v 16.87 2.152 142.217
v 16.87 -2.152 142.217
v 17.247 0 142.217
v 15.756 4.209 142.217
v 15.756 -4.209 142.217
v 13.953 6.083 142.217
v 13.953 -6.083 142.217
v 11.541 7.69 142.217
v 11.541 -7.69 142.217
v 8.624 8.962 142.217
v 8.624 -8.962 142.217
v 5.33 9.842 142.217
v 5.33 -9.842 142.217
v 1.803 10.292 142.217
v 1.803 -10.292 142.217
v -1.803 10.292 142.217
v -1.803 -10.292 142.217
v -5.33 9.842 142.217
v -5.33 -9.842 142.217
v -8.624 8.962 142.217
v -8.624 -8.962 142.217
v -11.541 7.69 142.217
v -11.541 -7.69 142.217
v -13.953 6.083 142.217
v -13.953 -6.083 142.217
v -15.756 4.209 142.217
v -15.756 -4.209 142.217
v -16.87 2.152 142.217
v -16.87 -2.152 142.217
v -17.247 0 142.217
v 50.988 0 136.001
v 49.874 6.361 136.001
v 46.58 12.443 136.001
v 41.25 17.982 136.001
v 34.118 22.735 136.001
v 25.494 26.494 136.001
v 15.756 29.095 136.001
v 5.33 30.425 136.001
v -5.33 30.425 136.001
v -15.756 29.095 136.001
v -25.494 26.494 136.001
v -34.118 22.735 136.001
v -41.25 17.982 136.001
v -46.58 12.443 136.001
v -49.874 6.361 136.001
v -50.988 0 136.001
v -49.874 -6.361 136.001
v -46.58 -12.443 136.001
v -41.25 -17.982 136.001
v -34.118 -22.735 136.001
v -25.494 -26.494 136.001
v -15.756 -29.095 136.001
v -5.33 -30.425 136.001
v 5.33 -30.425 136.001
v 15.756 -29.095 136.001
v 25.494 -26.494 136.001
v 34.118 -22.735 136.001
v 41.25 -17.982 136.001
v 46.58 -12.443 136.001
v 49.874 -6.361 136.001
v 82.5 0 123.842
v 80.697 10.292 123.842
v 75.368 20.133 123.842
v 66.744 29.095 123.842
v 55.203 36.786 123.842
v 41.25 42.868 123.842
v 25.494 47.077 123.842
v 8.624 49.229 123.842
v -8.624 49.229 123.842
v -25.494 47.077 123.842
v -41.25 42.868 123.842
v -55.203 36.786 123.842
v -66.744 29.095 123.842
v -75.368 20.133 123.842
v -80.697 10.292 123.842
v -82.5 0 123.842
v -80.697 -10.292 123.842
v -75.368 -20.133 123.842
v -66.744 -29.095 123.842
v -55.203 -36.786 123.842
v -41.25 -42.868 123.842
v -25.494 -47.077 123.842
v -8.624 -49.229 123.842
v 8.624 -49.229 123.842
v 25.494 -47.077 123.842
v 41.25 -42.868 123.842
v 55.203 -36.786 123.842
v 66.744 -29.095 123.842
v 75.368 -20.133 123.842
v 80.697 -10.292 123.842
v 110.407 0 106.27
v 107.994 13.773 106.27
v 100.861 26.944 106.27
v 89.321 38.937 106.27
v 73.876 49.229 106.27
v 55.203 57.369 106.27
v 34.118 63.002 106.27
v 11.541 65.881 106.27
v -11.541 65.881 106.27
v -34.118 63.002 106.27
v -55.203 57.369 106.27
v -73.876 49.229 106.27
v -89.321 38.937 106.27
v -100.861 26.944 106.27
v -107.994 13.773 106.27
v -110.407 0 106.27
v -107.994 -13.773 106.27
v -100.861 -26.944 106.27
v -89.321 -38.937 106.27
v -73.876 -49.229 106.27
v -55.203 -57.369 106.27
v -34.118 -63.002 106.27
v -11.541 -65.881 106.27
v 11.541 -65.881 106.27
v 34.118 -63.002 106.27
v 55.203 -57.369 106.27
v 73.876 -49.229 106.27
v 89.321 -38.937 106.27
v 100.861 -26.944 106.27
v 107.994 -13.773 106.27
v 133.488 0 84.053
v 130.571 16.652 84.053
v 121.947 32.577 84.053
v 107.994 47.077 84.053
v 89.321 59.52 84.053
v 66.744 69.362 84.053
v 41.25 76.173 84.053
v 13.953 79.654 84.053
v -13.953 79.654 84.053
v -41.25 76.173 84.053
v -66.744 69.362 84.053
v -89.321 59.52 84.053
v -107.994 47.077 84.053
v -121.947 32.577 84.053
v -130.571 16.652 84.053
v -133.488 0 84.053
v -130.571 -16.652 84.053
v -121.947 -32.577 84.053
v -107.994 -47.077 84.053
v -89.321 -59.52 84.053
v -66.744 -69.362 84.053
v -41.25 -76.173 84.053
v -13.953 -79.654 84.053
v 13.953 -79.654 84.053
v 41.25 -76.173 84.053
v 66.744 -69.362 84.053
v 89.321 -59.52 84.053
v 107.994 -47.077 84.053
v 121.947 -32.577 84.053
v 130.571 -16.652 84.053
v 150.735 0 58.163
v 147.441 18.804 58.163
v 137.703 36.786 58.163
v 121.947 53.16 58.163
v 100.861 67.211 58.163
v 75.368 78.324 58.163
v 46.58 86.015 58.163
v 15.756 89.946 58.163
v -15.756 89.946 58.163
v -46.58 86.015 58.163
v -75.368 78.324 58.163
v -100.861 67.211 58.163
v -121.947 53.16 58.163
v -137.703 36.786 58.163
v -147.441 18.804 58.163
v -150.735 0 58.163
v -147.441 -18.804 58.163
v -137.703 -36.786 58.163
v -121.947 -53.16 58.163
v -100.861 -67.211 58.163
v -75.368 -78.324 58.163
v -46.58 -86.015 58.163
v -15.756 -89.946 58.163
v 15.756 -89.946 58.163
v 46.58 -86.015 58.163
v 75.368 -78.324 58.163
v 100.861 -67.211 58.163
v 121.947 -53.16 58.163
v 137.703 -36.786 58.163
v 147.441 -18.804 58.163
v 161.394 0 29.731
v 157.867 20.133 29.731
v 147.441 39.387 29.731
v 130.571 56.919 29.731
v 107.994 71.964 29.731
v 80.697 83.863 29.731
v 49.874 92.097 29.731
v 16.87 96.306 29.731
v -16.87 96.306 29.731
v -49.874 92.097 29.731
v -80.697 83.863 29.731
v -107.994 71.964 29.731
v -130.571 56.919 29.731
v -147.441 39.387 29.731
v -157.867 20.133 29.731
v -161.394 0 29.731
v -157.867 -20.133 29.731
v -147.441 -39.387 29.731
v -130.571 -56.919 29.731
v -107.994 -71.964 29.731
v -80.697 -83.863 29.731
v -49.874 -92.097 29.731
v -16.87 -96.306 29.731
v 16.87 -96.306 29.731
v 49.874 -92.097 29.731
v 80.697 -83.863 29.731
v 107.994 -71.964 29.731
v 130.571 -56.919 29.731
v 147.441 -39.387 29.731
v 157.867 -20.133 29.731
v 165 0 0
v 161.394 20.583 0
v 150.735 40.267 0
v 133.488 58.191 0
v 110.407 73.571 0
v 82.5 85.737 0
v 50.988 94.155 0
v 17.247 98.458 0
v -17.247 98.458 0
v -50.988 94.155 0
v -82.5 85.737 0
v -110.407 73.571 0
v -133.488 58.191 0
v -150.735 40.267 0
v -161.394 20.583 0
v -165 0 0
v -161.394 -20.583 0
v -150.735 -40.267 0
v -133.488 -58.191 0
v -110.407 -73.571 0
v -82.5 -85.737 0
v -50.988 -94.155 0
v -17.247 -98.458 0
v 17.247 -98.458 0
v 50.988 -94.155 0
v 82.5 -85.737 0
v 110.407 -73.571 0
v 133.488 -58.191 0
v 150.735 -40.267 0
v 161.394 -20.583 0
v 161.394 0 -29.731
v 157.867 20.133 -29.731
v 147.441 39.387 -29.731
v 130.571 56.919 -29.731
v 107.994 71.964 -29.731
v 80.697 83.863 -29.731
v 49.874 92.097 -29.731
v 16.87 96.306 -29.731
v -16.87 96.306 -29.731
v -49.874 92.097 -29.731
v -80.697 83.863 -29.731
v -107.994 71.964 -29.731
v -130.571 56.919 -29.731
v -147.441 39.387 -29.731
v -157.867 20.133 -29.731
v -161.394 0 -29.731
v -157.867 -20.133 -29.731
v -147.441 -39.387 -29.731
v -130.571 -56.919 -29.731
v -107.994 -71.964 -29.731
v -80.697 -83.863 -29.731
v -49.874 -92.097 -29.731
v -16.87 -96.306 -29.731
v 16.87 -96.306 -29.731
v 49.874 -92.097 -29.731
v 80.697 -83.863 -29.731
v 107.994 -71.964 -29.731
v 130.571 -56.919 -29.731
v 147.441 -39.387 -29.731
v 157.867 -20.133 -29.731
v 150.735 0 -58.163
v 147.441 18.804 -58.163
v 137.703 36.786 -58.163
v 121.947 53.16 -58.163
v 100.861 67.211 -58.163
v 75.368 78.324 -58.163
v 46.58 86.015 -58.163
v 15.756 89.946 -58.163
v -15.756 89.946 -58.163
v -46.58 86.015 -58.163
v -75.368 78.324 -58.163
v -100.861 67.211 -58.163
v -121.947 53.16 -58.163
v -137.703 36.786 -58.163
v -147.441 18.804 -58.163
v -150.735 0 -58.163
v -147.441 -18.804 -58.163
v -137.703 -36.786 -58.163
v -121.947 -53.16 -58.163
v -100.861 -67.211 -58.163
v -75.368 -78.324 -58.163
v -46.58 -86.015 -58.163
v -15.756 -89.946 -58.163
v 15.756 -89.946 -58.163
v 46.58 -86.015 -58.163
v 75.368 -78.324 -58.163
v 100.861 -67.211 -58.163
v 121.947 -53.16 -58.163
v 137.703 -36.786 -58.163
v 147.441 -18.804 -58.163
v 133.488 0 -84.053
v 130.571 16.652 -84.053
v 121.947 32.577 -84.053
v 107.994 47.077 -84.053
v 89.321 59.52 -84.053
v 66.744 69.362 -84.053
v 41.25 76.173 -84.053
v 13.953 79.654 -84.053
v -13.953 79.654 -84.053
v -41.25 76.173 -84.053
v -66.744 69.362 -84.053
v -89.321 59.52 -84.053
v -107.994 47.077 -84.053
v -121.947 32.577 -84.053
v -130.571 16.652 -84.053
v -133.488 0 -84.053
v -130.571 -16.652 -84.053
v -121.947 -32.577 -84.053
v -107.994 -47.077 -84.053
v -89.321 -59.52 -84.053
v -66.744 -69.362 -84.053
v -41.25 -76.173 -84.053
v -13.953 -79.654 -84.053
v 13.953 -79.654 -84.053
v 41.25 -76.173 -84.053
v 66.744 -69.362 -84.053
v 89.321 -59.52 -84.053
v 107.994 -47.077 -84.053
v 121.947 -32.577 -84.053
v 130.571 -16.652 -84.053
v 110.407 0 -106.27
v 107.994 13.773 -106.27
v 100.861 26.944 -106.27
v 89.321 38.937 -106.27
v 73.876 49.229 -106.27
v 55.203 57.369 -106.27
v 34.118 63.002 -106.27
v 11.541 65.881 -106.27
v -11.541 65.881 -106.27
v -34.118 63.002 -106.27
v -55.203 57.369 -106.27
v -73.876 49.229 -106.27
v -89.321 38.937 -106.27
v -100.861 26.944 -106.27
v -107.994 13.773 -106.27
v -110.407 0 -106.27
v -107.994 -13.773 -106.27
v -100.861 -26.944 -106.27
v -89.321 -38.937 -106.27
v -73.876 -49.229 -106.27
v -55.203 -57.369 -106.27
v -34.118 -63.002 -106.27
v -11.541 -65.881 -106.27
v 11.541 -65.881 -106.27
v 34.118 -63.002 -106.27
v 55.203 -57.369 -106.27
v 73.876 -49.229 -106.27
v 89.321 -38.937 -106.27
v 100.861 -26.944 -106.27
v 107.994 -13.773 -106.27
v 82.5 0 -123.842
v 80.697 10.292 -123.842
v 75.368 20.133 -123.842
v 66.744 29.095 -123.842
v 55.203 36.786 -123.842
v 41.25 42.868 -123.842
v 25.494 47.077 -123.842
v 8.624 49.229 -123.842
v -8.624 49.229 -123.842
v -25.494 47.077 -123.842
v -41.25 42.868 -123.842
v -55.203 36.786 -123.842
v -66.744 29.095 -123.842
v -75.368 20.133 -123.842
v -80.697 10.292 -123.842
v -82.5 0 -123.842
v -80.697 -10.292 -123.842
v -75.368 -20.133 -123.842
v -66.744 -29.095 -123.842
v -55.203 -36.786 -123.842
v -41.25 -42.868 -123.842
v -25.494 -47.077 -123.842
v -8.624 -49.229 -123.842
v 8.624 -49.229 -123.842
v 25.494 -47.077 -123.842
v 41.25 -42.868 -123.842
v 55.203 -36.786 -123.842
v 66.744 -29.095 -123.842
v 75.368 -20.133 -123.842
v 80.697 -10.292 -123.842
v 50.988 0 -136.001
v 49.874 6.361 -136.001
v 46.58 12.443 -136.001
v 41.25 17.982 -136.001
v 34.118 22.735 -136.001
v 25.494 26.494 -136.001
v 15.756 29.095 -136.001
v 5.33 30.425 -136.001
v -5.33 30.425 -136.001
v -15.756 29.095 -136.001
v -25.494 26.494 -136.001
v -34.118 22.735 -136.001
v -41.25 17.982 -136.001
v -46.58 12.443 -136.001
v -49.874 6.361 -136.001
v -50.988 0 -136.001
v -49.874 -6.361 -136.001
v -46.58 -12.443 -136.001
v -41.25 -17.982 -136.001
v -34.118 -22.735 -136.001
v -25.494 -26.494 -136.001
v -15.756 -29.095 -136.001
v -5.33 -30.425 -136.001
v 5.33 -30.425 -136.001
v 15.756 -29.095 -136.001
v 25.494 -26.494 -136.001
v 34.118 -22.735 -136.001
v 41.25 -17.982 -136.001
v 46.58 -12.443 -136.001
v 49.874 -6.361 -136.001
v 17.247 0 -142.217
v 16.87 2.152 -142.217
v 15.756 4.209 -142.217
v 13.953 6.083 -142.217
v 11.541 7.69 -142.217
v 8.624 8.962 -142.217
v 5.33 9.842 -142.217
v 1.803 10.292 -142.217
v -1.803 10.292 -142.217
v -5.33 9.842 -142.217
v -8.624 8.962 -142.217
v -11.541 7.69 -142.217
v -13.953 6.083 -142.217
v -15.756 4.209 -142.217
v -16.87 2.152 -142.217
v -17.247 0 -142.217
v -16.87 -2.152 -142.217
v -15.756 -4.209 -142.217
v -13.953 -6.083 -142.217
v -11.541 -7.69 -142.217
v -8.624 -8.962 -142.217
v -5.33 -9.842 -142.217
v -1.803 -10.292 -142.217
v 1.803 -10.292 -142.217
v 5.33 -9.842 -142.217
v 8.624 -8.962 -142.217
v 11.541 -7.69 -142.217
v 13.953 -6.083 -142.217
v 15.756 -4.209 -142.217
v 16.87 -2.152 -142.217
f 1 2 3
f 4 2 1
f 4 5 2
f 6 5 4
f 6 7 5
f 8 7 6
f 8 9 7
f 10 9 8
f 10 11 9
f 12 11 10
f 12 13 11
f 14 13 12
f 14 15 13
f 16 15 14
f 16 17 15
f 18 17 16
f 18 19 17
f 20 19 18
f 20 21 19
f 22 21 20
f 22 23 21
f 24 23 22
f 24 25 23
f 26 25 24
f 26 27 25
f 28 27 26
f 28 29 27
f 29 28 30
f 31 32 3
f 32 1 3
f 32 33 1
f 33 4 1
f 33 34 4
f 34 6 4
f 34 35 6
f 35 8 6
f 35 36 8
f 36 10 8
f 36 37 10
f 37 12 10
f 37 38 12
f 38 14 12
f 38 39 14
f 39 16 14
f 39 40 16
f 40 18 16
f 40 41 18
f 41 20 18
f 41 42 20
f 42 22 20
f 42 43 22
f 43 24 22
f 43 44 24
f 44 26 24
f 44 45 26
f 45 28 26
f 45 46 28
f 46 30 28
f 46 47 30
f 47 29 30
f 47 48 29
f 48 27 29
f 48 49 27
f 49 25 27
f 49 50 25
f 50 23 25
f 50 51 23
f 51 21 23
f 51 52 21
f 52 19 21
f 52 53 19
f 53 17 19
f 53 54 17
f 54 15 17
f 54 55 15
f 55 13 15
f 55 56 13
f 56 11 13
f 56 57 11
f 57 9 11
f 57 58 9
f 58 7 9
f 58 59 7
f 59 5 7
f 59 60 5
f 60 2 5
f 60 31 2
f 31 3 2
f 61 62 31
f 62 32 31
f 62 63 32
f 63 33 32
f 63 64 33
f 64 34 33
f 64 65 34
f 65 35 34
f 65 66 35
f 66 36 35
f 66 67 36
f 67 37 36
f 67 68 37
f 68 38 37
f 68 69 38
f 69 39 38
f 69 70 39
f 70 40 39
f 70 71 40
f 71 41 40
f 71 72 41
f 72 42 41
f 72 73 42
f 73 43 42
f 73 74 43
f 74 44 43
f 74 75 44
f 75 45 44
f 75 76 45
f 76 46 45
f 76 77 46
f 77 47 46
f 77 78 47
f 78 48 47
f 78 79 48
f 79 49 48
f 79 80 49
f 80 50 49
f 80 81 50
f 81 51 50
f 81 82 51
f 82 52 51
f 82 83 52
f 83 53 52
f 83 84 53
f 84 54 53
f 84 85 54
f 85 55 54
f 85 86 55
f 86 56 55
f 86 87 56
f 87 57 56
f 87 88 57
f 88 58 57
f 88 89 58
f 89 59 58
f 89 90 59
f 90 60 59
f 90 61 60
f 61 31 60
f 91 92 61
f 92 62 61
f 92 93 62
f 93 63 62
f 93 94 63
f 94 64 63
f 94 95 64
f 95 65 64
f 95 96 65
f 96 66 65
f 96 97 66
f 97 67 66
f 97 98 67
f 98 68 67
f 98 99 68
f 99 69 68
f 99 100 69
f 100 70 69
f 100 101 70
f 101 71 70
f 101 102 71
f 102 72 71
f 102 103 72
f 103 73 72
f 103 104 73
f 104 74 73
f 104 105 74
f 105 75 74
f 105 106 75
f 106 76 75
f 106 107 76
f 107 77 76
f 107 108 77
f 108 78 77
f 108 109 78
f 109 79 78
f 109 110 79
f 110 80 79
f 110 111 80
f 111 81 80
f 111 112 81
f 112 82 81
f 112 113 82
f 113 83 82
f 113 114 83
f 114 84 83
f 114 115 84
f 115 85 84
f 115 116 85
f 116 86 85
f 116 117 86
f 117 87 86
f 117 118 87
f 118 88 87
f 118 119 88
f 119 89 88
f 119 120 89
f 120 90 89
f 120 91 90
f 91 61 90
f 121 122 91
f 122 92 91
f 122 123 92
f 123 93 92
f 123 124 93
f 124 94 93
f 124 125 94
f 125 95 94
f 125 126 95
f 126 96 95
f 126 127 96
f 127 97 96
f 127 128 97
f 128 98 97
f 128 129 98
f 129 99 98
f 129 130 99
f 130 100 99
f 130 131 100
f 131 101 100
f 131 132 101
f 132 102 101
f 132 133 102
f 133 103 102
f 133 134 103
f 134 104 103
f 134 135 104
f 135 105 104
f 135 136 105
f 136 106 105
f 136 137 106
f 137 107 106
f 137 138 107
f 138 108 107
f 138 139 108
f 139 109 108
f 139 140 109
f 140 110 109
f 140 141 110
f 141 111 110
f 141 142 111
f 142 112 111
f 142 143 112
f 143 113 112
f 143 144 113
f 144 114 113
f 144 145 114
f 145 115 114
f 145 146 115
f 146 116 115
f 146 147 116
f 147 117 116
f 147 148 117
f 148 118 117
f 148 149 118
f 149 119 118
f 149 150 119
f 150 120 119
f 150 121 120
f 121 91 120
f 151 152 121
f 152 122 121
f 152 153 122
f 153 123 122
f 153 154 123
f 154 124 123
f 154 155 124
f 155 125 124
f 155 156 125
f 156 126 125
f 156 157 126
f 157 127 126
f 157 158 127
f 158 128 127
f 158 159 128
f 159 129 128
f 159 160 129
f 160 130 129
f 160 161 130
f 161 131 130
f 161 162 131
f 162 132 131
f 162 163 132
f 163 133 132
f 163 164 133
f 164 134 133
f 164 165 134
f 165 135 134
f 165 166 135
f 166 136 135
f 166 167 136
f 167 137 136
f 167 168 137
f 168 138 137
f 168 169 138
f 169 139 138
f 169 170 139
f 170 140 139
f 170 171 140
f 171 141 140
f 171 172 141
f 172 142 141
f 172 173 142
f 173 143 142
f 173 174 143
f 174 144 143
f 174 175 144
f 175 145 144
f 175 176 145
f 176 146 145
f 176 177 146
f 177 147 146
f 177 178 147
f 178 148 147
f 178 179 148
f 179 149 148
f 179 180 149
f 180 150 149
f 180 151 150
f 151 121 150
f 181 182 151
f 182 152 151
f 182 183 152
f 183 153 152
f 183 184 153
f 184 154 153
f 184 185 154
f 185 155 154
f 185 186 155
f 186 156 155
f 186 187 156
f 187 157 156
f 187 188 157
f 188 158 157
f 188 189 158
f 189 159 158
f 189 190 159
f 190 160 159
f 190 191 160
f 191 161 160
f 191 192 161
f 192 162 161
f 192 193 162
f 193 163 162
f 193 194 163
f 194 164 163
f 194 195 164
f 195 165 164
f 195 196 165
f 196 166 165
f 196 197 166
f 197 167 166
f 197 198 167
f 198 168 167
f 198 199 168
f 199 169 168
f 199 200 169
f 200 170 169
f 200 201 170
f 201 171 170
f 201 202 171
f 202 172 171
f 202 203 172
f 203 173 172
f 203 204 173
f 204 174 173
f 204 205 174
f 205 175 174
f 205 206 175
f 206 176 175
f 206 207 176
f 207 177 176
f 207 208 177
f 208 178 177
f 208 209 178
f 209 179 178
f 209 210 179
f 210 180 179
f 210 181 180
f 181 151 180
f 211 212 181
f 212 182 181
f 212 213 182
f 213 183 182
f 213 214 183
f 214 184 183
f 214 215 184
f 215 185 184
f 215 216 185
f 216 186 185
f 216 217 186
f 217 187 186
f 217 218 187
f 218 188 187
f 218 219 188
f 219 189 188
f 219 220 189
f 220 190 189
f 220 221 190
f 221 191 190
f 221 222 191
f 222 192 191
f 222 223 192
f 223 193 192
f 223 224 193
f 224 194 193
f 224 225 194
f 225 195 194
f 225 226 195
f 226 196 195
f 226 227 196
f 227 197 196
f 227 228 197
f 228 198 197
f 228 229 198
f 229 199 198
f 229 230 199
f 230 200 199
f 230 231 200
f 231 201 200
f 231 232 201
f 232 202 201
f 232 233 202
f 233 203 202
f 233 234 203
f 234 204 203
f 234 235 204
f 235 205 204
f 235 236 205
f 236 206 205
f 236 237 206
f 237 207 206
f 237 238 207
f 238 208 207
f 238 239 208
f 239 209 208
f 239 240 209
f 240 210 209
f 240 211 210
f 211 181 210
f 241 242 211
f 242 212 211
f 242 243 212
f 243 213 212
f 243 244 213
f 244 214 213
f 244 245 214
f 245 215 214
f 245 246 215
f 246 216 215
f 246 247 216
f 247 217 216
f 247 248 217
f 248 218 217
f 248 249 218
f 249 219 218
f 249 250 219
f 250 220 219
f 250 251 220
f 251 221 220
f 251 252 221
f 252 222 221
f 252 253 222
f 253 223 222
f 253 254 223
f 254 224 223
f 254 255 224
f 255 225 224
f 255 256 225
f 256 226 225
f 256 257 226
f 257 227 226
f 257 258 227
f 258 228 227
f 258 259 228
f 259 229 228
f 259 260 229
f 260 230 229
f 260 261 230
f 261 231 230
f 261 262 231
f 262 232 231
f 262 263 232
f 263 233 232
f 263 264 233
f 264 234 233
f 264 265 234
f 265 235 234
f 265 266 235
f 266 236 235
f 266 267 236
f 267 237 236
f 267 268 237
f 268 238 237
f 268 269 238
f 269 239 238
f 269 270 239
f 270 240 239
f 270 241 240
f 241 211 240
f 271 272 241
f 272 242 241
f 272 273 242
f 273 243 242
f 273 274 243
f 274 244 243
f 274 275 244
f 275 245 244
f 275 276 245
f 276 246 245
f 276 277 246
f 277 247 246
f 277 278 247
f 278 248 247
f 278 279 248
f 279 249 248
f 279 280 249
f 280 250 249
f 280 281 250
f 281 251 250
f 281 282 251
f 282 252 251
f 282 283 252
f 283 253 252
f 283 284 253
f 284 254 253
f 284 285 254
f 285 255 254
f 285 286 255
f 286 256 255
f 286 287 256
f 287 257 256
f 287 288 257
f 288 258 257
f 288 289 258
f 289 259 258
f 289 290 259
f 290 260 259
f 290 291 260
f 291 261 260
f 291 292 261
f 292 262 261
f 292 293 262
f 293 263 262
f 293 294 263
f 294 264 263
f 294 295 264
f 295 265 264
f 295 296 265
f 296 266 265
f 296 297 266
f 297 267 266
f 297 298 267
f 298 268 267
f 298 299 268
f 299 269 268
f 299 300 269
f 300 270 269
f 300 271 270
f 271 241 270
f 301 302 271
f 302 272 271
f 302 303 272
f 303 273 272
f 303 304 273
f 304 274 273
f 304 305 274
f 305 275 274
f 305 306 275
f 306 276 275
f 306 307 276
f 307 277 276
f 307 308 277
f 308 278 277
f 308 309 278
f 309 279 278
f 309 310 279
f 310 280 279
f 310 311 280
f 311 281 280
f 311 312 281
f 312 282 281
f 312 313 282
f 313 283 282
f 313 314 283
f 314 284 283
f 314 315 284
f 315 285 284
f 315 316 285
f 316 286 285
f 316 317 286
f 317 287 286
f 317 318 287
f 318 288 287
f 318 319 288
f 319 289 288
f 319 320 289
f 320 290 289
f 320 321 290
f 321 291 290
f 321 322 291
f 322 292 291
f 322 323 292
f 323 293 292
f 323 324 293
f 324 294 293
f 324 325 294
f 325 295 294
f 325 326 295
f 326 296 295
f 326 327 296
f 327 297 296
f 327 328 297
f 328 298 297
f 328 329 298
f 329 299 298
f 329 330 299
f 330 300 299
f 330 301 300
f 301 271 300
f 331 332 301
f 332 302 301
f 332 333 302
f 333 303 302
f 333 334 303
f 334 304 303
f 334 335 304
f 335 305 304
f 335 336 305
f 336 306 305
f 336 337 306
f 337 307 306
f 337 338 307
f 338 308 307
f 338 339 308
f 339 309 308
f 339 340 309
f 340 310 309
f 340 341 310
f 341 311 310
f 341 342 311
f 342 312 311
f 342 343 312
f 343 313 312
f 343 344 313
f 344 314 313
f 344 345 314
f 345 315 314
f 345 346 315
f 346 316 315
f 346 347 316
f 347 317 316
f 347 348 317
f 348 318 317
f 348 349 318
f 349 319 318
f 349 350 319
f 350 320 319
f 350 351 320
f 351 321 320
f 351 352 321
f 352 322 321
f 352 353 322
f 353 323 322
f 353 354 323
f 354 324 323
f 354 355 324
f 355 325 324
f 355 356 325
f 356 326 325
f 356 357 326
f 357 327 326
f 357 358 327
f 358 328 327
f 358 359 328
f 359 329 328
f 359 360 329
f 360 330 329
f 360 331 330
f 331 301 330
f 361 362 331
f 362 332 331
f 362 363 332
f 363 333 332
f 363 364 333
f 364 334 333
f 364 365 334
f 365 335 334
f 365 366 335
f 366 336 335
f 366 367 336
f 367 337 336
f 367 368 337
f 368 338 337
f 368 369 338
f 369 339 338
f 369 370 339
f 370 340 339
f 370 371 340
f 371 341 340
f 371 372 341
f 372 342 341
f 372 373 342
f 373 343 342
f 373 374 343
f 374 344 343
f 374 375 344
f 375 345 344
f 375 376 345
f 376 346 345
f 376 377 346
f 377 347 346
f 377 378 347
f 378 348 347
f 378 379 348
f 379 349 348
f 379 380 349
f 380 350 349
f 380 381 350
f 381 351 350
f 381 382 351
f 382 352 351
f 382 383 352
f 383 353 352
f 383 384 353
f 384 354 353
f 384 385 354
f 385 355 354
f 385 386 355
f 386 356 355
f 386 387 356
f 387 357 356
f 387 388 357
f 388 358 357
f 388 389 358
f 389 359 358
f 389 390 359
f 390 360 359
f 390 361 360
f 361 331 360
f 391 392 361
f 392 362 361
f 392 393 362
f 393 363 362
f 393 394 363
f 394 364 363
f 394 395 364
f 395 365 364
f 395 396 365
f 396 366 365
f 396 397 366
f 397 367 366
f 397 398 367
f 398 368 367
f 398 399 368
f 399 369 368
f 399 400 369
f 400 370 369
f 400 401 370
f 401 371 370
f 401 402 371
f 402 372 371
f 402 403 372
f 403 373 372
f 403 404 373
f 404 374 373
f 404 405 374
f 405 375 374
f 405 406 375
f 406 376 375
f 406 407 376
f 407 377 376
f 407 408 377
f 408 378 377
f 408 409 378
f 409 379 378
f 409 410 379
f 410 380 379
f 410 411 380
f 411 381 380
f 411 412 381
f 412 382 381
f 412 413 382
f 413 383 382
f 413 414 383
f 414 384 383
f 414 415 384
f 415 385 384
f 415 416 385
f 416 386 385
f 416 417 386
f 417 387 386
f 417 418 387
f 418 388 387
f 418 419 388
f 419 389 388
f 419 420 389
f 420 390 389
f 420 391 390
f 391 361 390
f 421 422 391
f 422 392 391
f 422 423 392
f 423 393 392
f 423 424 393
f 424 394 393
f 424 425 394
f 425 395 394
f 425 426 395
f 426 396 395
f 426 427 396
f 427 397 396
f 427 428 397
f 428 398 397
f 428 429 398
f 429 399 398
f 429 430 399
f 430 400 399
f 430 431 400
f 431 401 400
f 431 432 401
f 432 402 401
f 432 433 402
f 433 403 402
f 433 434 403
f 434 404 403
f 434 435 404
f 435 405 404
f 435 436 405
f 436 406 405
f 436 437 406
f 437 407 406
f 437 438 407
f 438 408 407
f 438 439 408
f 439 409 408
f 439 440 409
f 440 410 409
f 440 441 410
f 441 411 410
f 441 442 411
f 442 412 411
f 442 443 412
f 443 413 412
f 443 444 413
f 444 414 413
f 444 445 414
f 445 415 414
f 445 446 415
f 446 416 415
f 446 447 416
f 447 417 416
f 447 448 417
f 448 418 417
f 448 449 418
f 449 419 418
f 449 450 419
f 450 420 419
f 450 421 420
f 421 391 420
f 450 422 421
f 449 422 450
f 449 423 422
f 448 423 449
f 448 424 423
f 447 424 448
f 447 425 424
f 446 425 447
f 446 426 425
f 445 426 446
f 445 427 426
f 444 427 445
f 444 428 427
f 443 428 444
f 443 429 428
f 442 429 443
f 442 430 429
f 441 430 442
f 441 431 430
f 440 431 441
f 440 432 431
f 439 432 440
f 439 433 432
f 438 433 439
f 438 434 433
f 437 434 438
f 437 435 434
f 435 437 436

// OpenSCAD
// Generated by SolidPython 1.0.1 on 2020-07-29 00:46:52


scale(v = [15, 9, 13]) {
	sphere(r = 11);
}
/***********************************************
*********      SolidPython code:      **********
************************************************
 
# import packages: SolidPython
from solid import *
from solid.utils import *
from itertools import chain, combinations, permutations


class Resize:

    def __init__(self, scad_file):
        self.scad_file = scad_file
        #self.scad_file = import_scad(scad_file)
        # cone/cylinder param:
        self.r1 = 0
        self.r2 = 0
        self.h = 0
        # rectangular prism param:
        self.w = 0
        self.l = 0
        # ellipse param:
        self.r = 0

    # import OpenScad code (file name corresponds to shape)


    # classify shape + parameters
    def assign(self, param1, param2, param3):
        if self.scad_file == 'cone.scad':
            self.r1 = param1
            self.r2 = param2
            self.h = param3
        elif self.scad_file == 'cylinder.scad':
            self.r1 = param1
            self.r2 = param2
            self.h = param3
        elif self.scad_file == 'rectangularPrism.scad':
            self.h = param1
            self.l = param2
            self.w = param3
        else:
            self.r = param1
            self.h = param2

    # resize parameters
    def iterate(self):
        x = range(3, 20, 2)
        i = 1
        if self.scad_file == 'cone.scad':
            tempList = list(permutations(x, 2))
            for temp in tempList:
                param1 = temp[0]
                param2 = temp[1]
                filepath = 'produced_scad_files/' + 'cone' + str(param1) + '_' + str(param2) + '_' + '.scad'
                scad_render_to_file(cylinder(h=param1, r1=param2, r2=0), filepath)

        elif self.scad_file == 'cylinder.scad':
            tempList = list(permutations(x, 3))
            for temp in tempList:
                param1 = temp[0]
                param2 = temp[1]
                filepath = 'produced_scad_files/' + 'cylinder' + str(param1) + '_' + str(param2) + '_' + '.scad'
                scad_render_to_file(cylinder(h=param1, r1=param2, r2=param2), filepath)

        elif self.scad_file == 'rectangularPrism.scad':
            tempList = list(permutations(x, 3))
            for temp in tempList:
                param1 = temp[0]
                param2 = temp[1]
                param3 = temp[2]
                filepath = 'produced_scad_files/' + 'rectangularPrism' + str(param1) + '_' + str(param2) + '_' + str(
                    param3) + '.scad'
                scad_render_to_file(cube(size=(param1, param2, param3)), filepath)

        elif self.scad_file == 'ellipse.scad':
            tempList = list(permutations(x, 4))
            for temp in tempList:
                param1 = temp[0]
                param2 = temp[1]
                param3 = temp[2]
                param4 = temp[3]
                filepath = 'produced_scad_files/' + 'ellipse' + str(param1) + '_' + str(param2) + '_' + str(param3) + '_' + str(param4) + '.scad'
                scad_render_to_file(scale([param1, param2, param3])(sphere(r=param4)), filepath)

    def render_to_scadfile(self):
        scad_render_to_file(scad, 'example.scad') 
 
************************************************/
